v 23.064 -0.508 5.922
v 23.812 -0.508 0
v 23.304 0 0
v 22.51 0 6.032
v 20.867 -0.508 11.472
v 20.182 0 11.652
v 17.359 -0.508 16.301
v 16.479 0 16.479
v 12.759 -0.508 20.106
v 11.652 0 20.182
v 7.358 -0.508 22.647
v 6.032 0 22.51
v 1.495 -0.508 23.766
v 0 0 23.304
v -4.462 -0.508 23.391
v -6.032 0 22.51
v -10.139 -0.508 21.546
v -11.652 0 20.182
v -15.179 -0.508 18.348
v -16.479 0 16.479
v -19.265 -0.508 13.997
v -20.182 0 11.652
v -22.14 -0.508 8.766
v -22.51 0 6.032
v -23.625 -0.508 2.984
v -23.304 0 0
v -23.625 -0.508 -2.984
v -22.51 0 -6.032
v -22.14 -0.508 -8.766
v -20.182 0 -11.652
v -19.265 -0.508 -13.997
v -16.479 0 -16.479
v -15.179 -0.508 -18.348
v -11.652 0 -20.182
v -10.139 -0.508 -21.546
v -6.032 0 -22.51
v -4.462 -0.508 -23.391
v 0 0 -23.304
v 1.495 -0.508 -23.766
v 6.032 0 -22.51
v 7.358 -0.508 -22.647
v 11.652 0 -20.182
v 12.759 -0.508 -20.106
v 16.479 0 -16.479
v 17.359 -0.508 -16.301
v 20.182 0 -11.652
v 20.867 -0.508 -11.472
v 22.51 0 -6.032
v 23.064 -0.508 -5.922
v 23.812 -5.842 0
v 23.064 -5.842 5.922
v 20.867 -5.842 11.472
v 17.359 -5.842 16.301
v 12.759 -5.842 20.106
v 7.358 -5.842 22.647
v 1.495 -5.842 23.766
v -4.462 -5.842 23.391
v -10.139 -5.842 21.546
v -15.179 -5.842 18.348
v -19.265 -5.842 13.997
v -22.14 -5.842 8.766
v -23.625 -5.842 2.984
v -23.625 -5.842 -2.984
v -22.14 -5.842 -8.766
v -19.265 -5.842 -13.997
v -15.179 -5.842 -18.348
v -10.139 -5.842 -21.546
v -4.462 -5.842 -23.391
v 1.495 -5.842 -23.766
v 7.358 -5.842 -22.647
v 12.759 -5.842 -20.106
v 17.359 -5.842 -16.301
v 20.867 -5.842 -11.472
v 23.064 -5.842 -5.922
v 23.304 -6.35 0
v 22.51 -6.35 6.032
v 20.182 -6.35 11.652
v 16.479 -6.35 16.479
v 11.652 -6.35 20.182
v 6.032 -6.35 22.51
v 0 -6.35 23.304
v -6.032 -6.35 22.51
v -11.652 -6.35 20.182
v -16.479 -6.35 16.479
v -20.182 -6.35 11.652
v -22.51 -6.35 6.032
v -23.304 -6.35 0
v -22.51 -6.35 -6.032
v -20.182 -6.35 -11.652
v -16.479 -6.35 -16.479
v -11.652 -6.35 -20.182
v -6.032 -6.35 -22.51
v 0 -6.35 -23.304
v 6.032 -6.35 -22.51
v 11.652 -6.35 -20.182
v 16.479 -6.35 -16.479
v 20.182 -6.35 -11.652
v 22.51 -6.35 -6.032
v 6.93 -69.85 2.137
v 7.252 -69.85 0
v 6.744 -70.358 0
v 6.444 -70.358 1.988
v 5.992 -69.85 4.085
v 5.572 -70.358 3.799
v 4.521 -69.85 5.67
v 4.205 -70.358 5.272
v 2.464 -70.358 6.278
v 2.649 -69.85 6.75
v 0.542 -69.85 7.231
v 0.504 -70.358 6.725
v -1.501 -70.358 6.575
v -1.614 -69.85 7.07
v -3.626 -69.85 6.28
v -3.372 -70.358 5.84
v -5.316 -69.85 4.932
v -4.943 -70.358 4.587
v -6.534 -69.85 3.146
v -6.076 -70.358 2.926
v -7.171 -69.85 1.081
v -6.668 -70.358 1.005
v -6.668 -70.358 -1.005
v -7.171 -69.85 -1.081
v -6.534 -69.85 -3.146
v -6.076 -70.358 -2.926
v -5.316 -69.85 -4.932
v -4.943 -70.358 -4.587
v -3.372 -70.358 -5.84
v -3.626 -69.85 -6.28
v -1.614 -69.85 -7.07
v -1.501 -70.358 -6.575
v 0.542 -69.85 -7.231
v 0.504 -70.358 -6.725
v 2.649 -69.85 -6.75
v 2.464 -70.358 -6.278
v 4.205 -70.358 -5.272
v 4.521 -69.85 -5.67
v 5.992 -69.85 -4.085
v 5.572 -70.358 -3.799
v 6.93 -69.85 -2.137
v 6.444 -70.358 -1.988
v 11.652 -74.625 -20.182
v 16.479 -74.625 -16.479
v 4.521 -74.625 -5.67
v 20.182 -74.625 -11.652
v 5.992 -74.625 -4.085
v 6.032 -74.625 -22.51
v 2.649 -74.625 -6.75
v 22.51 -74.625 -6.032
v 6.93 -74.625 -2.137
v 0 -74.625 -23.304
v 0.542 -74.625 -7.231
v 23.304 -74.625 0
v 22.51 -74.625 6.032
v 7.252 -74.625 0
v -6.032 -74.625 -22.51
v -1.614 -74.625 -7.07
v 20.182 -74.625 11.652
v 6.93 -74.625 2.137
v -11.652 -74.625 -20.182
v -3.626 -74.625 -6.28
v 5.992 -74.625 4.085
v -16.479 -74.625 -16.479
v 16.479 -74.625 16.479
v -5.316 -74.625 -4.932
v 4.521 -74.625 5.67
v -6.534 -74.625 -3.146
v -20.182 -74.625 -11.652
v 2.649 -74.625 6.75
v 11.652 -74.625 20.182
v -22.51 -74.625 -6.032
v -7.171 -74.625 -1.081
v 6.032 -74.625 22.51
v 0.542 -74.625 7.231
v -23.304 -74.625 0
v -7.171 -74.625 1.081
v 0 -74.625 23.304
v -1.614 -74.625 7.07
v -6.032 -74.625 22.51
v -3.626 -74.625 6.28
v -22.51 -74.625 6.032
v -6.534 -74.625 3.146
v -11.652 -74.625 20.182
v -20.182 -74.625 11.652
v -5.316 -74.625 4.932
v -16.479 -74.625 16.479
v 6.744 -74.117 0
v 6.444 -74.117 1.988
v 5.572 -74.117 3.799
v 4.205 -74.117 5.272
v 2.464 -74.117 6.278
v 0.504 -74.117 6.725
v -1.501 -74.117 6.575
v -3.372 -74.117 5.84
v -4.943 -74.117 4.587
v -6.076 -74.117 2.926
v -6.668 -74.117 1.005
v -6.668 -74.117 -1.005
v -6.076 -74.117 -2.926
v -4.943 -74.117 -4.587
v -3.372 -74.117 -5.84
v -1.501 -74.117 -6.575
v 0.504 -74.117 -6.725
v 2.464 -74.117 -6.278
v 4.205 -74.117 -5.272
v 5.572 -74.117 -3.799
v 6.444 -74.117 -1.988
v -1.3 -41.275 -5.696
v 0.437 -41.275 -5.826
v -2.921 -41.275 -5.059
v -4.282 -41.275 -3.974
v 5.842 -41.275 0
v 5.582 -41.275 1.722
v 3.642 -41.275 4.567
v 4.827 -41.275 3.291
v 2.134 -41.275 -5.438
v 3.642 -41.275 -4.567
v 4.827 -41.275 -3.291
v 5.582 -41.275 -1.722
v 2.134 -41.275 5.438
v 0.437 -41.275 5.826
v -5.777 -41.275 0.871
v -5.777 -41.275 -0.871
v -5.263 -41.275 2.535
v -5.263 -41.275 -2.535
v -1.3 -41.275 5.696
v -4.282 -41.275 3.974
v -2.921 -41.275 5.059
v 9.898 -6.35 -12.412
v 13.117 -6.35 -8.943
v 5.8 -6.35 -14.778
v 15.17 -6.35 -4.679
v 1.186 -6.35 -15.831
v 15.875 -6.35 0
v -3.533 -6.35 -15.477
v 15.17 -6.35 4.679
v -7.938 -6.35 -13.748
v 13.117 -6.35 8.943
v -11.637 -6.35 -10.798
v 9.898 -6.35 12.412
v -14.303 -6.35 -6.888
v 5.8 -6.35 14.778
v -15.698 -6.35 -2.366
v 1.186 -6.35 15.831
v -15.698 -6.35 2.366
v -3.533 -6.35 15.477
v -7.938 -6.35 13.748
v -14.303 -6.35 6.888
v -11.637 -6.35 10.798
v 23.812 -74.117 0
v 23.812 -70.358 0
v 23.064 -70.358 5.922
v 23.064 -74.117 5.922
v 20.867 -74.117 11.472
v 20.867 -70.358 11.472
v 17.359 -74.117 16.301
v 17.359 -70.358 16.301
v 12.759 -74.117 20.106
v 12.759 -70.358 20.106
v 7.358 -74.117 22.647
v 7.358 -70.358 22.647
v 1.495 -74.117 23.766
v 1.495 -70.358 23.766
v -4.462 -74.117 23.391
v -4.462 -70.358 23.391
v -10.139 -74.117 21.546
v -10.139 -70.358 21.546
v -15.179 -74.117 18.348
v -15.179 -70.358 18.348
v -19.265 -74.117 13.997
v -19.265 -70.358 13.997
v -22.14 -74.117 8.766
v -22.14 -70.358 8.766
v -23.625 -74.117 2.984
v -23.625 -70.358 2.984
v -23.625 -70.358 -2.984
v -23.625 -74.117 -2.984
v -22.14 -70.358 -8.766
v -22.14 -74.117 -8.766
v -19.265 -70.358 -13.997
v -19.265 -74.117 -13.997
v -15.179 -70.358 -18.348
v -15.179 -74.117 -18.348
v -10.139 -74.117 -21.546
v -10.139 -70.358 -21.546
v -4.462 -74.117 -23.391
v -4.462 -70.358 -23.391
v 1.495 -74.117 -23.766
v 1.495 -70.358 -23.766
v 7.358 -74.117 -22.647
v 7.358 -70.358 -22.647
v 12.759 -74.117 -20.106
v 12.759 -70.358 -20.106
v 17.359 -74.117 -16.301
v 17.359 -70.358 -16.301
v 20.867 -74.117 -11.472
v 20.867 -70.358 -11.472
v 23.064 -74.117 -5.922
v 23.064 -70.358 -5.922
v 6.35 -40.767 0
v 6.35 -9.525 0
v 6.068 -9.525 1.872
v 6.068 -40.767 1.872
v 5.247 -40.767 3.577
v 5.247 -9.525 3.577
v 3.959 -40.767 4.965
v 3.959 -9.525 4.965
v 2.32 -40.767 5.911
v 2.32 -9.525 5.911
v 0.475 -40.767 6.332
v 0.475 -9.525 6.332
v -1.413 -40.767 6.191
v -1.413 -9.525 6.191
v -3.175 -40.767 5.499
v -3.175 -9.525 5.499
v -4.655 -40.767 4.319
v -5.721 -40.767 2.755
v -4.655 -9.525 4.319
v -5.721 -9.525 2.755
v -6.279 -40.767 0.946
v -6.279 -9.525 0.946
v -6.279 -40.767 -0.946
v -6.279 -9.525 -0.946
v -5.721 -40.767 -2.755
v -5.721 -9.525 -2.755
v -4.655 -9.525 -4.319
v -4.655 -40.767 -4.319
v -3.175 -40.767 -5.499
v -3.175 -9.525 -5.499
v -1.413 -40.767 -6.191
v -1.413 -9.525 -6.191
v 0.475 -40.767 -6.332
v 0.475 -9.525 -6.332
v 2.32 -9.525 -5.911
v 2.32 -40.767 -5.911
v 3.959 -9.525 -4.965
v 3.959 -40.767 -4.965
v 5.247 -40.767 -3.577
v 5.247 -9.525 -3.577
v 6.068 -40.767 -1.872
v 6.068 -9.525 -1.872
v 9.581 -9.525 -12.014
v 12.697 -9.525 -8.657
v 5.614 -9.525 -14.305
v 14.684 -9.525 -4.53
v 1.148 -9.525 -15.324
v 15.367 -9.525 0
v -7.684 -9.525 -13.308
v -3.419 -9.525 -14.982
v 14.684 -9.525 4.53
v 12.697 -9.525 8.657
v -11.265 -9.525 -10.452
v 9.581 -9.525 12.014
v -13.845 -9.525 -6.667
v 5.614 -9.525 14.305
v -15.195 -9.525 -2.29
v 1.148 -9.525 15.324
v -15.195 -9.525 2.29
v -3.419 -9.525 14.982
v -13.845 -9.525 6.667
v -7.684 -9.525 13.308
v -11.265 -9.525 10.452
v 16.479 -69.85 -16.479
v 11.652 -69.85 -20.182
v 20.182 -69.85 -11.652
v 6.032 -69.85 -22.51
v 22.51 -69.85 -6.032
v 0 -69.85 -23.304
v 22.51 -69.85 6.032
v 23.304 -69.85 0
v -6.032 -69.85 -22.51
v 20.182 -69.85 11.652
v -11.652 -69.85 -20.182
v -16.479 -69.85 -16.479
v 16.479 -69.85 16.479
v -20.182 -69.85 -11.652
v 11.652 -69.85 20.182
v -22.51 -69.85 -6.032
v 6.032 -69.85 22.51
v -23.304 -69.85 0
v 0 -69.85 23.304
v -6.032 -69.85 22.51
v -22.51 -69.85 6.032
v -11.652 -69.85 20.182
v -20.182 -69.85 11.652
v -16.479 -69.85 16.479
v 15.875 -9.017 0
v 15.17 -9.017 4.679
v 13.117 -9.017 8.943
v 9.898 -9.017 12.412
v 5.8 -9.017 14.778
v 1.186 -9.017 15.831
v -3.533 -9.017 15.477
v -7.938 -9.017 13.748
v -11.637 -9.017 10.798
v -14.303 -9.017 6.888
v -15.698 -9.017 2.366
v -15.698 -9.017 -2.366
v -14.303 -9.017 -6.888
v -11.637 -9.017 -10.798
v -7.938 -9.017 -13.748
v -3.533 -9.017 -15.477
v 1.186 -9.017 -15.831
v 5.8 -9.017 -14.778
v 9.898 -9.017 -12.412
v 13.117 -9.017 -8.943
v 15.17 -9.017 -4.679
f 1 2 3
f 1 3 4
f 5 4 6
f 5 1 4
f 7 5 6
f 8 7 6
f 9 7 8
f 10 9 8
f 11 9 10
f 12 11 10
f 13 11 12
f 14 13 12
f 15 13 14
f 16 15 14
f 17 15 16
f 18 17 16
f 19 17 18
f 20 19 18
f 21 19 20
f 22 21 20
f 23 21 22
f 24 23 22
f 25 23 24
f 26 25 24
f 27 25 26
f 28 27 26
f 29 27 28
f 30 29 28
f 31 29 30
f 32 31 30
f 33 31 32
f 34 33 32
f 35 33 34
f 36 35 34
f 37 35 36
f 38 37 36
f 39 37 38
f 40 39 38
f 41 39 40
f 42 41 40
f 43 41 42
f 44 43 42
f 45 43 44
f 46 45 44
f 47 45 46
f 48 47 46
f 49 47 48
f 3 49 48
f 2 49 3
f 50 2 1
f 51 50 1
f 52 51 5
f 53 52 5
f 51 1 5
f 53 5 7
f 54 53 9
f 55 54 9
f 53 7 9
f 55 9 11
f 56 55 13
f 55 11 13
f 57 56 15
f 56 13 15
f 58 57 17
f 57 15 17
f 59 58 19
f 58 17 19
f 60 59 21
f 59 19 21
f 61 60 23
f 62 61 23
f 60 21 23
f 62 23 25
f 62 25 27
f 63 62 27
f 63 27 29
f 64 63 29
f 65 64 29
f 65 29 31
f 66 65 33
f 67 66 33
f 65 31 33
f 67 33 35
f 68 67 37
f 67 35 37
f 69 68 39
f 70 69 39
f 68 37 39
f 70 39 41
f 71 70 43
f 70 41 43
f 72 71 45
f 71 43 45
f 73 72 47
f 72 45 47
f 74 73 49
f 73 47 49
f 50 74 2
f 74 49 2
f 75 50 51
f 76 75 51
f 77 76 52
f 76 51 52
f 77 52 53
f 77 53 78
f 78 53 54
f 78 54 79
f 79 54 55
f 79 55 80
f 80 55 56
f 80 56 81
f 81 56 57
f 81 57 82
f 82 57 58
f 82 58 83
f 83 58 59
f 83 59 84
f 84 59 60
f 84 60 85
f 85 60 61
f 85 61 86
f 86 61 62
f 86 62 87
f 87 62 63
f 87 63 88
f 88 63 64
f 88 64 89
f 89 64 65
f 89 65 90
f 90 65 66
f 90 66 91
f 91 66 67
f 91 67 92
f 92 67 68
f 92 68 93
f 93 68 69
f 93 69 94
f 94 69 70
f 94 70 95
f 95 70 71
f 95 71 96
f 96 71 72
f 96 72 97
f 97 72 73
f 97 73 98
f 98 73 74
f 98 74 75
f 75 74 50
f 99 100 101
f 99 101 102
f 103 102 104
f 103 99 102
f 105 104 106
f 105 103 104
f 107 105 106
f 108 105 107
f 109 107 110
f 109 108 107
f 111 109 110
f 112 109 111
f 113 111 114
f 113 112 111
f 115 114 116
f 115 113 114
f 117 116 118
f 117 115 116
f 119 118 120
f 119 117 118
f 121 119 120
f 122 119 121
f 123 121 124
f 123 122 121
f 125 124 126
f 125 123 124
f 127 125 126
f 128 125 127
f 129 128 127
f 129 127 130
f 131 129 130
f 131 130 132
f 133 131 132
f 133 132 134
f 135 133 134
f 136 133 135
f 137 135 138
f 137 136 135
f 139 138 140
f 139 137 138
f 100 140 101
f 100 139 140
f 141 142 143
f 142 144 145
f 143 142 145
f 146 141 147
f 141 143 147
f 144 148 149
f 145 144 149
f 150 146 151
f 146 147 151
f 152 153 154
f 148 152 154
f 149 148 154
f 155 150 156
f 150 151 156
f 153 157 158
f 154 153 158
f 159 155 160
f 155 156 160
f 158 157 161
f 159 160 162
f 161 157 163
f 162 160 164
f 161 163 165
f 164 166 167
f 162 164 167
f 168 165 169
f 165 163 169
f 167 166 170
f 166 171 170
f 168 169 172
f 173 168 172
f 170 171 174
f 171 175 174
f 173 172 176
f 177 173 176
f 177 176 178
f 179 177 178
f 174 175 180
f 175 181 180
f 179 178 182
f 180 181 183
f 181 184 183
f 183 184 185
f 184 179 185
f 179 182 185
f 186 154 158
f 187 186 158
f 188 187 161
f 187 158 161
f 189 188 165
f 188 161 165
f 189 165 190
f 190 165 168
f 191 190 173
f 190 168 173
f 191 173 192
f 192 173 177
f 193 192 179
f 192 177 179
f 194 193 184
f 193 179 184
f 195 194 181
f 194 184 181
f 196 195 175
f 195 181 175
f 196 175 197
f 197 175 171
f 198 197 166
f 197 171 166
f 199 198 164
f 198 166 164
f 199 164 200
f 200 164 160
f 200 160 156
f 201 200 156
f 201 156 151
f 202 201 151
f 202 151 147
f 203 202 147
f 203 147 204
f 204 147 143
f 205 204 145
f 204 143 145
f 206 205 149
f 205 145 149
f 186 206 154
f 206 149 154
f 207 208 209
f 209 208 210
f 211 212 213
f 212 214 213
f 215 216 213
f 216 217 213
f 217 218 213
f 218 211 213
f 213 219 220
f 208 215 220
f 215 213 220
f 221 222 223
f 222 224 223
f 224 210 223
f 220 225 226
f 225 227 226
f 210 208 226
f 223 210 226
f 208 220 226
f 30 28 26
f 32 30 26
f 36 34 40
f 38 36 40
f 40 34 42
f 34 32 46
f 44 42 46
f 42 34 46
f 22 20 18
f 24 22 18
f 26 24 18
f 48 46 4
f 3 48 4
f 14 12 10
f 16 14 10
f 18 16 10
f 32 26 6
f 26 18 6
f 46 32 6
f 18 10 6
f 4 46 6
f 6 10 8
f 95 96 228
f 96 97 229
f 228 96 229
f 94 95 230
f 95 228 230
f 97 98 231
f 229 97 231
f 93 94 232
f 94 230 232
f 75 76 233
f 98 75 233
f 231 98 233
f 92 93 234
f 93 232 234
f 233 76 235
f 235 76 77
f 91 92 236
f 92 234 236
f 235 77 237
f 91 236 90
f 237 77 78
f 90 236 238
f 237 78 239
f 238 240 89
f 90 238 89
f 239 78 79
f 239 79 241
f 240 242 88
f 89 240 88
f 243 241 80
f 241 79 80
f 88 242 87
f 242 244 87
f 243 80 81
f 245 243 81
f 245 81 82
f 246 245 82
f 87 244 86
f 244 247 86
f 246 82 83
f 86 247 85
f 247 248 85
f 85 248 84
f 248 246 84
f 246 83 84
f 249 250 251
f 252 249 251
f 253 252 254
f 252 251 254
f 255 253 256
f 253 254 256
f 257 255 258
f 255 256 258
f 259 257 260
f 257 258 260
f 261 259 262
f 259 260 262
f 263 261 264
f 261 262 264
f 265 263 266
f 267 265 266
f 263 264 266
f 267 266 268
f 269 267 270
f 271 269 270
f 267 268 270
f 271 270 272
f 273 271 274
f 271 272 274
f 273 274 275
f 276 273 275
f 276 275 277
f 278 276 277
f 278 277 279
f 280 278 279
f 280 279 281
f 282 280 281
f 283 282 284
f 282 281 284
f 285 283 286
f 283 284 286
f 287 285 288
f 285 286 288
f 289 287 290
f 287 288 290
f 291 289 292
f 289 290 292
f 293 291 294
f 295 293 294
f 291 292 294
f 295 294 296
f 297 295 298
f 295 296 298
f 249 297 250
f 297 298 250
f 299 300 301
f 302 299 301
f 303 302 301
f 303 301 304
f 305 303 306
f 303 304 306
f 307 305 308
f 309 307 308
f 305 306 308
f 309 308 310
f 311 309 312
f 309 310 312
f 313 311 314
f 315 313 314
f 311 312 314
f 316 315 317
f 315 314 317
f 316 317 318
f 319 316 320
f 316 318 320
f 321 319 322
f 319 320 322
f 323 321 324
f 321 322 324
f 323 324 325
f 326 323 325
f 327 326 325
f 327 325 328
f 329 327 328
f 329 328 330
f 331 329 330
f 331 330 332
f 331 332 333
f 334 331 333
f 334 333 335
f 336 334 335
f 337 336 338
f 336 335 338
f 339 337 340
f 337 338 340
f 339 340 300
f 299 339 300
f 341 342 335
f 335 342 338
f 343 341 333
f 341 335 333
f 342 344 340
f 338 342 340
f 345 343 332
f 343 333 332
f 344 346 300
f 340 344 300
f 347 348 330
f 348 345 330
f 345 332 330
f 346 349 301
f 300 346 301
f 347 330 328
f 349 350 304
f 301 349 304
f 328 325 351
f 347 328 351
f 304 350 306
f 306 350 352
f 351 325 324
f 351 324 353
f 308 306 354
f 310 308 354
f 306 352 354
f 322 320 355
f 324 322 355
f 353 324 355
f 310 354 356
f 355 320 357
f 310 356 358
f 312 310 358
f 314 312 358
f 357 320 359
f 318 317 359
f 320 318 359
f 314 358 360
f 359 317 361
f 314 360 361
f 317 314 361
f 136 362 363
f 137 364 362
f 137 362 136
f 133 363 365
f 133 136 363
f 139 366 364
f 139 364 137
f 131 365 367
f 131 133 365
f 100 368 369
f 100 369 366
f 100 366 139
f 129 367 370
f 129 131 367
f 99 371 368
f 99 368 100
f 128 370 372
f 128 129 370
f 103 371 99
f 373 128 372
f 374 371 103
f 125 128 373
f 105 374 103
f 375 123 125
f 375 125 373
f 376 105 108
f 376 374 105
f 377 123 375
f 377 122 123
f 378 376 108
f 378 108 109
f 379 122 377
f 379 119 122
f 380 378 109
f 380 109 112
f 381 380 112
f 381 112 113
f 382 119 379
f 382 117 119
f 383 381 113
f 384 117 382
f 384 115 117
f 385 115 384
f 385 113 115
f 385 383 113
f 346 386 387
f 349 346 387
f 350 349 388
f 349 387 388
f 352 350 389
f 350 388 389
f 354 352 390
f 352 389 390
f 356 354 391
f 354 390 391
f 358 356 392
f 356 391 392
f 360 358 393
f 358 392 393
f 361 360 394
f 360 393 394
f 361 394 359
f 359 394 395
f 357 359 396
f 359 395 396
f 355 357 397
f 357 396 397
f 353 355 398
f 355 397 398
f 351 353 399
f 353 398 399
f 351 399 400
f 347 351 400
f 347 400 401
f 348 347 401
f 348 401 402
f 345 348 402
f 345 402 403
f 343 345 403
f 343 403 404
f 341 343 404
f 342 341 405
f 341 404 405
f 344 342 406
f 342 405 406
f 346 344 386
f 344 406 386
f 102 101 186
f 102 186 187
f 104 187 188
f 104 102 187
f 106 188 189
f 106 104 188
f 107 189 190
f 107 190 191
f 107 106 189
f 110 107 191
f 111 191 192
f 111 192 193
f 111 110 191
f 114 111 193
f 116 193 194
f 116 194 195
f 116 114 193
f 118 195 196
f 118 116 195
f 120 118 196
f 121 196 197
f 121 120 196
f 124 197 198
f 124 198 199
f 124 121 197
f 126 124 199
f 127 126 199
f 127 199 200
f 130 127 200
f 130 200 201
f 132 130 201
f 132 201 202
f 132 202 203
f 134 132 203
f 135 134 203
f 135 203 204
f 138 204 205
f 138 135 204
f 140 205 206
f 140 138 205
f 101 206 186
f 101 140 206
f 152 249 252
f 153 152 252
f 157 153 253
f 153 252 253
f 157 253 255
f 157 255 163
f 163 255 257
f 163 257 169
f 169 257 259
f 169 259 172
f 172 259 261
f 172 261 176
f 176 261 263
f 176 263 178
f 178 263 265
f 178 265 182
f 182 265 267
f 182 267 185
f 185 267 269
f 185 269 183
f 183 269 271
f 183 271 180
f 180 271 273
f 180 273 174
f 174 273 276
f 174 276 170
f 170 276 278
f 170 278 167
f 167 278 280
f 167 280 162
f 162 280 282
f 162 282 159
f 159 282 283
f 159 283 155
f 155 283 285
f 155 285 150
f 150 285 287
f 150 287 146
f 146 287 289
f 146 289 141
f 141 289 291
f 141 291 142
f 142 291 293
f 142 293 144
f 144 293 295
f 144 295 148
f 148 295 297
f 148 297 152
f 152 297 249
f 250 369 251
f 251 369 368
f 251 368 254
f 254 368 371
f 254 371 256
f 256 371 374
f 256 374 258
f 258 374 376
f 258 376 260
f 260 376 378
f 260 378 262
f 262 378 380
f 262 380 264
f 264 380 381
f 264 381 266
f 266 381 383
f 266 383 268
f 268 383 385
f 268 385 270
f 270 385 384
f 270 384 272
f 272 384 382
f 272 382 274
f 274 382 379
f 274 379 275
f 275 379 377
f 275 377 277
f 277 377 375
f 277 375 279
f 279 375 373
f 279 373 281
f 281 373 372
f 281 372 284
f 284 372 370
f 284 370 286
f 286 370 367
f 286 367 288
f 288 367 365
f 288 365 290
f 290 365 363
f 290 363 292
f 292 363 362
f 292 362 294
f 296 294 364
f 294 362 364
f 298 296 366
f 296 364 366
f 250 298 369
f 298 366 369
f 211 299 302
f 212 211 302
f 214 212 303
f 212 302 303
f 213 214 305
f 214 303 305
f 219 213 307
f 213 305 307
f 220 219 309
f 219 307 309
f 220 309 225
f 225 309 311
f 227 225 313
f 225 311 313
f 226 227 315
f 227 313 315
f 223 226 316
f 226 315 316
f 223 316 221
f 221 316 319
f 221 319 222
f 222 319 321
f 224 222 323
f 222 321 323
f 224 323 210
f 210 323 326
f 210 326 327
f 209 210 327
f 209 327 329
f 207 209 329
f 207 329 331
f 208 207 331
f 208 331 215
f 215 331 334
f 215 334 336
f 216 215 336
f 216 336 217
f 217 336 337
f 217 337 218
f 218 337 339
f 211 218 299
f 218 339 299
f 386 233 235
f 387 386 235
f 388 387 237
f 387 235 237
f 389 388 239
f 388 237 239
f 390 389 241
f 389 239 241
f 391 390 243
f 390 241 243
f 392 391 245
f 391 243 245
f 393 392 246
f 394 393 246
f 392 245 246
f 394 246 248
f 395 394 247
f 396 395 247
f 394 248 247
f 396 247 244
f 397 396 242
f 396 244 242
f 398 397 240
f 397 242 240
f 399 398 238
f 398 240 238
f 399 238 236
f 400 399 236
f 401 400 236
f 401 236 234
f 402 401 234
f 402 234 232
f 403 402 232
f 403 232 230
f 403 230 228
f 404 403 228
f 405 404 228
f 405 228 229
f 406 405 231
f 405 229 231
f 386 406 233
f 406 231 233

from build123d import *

# Parameters (mm, degrees)
F2_W      = 17.0688
F2_H      = 4.7752
F4_SIZE   = 0.508
F4_2_SIZE = 0.508


with BuildPart() as f1:
    # F0 (on Top) → F1 (revolve)
    with BuildSketch(Plane.XY):
        Polygon((23.8125, 0), (0, 0), (0, -41.275), (6.35, -41.275), (6.35, -9.525), (15.875, -9.525), (15.875, -6.35), (23.8125, -6.35), align=None)
    revolve(axis=Axis((0, 17.466236, 0), (0, -1, 0)))

    # F4
    f4_edges = [f1.edges().sort_by_distance(p)[0] for p in [
        (-23.8125, 0, 0),
        (-23.8125, -6.35, 0),
        (-15.875, -9.525, 0),
        (-6.35, -41.275, 0),
    ]]
    chamfer(f4_edges, length=F4_SIZE)


with BuildPart() as f3:
    # F2 (on Top) → F3 (revolve)
    with BuildSketch(Plane.XY):
        with Locations((15.2781, -72.2376)):
            Rectangle(F2_W, F2_H)
    revolve(axis=Axis((0, -46.904461, 0), (0, -1, 0)))

    # F4#2
    f4_2_edges = [f3.edges().sort_by_distance(p)[0] for p in [
        (-23.8125, -69.85, 0),
        (-23.8125, -74.6252, 0),
        (-6.7437, -74.6252, 0),
        (-6.7437, -69.85, 0),
    ]]
    chamfer(f4_2_edges, length=F4_2_SIZE)


solid = Compound([f1.part, f3.part])
